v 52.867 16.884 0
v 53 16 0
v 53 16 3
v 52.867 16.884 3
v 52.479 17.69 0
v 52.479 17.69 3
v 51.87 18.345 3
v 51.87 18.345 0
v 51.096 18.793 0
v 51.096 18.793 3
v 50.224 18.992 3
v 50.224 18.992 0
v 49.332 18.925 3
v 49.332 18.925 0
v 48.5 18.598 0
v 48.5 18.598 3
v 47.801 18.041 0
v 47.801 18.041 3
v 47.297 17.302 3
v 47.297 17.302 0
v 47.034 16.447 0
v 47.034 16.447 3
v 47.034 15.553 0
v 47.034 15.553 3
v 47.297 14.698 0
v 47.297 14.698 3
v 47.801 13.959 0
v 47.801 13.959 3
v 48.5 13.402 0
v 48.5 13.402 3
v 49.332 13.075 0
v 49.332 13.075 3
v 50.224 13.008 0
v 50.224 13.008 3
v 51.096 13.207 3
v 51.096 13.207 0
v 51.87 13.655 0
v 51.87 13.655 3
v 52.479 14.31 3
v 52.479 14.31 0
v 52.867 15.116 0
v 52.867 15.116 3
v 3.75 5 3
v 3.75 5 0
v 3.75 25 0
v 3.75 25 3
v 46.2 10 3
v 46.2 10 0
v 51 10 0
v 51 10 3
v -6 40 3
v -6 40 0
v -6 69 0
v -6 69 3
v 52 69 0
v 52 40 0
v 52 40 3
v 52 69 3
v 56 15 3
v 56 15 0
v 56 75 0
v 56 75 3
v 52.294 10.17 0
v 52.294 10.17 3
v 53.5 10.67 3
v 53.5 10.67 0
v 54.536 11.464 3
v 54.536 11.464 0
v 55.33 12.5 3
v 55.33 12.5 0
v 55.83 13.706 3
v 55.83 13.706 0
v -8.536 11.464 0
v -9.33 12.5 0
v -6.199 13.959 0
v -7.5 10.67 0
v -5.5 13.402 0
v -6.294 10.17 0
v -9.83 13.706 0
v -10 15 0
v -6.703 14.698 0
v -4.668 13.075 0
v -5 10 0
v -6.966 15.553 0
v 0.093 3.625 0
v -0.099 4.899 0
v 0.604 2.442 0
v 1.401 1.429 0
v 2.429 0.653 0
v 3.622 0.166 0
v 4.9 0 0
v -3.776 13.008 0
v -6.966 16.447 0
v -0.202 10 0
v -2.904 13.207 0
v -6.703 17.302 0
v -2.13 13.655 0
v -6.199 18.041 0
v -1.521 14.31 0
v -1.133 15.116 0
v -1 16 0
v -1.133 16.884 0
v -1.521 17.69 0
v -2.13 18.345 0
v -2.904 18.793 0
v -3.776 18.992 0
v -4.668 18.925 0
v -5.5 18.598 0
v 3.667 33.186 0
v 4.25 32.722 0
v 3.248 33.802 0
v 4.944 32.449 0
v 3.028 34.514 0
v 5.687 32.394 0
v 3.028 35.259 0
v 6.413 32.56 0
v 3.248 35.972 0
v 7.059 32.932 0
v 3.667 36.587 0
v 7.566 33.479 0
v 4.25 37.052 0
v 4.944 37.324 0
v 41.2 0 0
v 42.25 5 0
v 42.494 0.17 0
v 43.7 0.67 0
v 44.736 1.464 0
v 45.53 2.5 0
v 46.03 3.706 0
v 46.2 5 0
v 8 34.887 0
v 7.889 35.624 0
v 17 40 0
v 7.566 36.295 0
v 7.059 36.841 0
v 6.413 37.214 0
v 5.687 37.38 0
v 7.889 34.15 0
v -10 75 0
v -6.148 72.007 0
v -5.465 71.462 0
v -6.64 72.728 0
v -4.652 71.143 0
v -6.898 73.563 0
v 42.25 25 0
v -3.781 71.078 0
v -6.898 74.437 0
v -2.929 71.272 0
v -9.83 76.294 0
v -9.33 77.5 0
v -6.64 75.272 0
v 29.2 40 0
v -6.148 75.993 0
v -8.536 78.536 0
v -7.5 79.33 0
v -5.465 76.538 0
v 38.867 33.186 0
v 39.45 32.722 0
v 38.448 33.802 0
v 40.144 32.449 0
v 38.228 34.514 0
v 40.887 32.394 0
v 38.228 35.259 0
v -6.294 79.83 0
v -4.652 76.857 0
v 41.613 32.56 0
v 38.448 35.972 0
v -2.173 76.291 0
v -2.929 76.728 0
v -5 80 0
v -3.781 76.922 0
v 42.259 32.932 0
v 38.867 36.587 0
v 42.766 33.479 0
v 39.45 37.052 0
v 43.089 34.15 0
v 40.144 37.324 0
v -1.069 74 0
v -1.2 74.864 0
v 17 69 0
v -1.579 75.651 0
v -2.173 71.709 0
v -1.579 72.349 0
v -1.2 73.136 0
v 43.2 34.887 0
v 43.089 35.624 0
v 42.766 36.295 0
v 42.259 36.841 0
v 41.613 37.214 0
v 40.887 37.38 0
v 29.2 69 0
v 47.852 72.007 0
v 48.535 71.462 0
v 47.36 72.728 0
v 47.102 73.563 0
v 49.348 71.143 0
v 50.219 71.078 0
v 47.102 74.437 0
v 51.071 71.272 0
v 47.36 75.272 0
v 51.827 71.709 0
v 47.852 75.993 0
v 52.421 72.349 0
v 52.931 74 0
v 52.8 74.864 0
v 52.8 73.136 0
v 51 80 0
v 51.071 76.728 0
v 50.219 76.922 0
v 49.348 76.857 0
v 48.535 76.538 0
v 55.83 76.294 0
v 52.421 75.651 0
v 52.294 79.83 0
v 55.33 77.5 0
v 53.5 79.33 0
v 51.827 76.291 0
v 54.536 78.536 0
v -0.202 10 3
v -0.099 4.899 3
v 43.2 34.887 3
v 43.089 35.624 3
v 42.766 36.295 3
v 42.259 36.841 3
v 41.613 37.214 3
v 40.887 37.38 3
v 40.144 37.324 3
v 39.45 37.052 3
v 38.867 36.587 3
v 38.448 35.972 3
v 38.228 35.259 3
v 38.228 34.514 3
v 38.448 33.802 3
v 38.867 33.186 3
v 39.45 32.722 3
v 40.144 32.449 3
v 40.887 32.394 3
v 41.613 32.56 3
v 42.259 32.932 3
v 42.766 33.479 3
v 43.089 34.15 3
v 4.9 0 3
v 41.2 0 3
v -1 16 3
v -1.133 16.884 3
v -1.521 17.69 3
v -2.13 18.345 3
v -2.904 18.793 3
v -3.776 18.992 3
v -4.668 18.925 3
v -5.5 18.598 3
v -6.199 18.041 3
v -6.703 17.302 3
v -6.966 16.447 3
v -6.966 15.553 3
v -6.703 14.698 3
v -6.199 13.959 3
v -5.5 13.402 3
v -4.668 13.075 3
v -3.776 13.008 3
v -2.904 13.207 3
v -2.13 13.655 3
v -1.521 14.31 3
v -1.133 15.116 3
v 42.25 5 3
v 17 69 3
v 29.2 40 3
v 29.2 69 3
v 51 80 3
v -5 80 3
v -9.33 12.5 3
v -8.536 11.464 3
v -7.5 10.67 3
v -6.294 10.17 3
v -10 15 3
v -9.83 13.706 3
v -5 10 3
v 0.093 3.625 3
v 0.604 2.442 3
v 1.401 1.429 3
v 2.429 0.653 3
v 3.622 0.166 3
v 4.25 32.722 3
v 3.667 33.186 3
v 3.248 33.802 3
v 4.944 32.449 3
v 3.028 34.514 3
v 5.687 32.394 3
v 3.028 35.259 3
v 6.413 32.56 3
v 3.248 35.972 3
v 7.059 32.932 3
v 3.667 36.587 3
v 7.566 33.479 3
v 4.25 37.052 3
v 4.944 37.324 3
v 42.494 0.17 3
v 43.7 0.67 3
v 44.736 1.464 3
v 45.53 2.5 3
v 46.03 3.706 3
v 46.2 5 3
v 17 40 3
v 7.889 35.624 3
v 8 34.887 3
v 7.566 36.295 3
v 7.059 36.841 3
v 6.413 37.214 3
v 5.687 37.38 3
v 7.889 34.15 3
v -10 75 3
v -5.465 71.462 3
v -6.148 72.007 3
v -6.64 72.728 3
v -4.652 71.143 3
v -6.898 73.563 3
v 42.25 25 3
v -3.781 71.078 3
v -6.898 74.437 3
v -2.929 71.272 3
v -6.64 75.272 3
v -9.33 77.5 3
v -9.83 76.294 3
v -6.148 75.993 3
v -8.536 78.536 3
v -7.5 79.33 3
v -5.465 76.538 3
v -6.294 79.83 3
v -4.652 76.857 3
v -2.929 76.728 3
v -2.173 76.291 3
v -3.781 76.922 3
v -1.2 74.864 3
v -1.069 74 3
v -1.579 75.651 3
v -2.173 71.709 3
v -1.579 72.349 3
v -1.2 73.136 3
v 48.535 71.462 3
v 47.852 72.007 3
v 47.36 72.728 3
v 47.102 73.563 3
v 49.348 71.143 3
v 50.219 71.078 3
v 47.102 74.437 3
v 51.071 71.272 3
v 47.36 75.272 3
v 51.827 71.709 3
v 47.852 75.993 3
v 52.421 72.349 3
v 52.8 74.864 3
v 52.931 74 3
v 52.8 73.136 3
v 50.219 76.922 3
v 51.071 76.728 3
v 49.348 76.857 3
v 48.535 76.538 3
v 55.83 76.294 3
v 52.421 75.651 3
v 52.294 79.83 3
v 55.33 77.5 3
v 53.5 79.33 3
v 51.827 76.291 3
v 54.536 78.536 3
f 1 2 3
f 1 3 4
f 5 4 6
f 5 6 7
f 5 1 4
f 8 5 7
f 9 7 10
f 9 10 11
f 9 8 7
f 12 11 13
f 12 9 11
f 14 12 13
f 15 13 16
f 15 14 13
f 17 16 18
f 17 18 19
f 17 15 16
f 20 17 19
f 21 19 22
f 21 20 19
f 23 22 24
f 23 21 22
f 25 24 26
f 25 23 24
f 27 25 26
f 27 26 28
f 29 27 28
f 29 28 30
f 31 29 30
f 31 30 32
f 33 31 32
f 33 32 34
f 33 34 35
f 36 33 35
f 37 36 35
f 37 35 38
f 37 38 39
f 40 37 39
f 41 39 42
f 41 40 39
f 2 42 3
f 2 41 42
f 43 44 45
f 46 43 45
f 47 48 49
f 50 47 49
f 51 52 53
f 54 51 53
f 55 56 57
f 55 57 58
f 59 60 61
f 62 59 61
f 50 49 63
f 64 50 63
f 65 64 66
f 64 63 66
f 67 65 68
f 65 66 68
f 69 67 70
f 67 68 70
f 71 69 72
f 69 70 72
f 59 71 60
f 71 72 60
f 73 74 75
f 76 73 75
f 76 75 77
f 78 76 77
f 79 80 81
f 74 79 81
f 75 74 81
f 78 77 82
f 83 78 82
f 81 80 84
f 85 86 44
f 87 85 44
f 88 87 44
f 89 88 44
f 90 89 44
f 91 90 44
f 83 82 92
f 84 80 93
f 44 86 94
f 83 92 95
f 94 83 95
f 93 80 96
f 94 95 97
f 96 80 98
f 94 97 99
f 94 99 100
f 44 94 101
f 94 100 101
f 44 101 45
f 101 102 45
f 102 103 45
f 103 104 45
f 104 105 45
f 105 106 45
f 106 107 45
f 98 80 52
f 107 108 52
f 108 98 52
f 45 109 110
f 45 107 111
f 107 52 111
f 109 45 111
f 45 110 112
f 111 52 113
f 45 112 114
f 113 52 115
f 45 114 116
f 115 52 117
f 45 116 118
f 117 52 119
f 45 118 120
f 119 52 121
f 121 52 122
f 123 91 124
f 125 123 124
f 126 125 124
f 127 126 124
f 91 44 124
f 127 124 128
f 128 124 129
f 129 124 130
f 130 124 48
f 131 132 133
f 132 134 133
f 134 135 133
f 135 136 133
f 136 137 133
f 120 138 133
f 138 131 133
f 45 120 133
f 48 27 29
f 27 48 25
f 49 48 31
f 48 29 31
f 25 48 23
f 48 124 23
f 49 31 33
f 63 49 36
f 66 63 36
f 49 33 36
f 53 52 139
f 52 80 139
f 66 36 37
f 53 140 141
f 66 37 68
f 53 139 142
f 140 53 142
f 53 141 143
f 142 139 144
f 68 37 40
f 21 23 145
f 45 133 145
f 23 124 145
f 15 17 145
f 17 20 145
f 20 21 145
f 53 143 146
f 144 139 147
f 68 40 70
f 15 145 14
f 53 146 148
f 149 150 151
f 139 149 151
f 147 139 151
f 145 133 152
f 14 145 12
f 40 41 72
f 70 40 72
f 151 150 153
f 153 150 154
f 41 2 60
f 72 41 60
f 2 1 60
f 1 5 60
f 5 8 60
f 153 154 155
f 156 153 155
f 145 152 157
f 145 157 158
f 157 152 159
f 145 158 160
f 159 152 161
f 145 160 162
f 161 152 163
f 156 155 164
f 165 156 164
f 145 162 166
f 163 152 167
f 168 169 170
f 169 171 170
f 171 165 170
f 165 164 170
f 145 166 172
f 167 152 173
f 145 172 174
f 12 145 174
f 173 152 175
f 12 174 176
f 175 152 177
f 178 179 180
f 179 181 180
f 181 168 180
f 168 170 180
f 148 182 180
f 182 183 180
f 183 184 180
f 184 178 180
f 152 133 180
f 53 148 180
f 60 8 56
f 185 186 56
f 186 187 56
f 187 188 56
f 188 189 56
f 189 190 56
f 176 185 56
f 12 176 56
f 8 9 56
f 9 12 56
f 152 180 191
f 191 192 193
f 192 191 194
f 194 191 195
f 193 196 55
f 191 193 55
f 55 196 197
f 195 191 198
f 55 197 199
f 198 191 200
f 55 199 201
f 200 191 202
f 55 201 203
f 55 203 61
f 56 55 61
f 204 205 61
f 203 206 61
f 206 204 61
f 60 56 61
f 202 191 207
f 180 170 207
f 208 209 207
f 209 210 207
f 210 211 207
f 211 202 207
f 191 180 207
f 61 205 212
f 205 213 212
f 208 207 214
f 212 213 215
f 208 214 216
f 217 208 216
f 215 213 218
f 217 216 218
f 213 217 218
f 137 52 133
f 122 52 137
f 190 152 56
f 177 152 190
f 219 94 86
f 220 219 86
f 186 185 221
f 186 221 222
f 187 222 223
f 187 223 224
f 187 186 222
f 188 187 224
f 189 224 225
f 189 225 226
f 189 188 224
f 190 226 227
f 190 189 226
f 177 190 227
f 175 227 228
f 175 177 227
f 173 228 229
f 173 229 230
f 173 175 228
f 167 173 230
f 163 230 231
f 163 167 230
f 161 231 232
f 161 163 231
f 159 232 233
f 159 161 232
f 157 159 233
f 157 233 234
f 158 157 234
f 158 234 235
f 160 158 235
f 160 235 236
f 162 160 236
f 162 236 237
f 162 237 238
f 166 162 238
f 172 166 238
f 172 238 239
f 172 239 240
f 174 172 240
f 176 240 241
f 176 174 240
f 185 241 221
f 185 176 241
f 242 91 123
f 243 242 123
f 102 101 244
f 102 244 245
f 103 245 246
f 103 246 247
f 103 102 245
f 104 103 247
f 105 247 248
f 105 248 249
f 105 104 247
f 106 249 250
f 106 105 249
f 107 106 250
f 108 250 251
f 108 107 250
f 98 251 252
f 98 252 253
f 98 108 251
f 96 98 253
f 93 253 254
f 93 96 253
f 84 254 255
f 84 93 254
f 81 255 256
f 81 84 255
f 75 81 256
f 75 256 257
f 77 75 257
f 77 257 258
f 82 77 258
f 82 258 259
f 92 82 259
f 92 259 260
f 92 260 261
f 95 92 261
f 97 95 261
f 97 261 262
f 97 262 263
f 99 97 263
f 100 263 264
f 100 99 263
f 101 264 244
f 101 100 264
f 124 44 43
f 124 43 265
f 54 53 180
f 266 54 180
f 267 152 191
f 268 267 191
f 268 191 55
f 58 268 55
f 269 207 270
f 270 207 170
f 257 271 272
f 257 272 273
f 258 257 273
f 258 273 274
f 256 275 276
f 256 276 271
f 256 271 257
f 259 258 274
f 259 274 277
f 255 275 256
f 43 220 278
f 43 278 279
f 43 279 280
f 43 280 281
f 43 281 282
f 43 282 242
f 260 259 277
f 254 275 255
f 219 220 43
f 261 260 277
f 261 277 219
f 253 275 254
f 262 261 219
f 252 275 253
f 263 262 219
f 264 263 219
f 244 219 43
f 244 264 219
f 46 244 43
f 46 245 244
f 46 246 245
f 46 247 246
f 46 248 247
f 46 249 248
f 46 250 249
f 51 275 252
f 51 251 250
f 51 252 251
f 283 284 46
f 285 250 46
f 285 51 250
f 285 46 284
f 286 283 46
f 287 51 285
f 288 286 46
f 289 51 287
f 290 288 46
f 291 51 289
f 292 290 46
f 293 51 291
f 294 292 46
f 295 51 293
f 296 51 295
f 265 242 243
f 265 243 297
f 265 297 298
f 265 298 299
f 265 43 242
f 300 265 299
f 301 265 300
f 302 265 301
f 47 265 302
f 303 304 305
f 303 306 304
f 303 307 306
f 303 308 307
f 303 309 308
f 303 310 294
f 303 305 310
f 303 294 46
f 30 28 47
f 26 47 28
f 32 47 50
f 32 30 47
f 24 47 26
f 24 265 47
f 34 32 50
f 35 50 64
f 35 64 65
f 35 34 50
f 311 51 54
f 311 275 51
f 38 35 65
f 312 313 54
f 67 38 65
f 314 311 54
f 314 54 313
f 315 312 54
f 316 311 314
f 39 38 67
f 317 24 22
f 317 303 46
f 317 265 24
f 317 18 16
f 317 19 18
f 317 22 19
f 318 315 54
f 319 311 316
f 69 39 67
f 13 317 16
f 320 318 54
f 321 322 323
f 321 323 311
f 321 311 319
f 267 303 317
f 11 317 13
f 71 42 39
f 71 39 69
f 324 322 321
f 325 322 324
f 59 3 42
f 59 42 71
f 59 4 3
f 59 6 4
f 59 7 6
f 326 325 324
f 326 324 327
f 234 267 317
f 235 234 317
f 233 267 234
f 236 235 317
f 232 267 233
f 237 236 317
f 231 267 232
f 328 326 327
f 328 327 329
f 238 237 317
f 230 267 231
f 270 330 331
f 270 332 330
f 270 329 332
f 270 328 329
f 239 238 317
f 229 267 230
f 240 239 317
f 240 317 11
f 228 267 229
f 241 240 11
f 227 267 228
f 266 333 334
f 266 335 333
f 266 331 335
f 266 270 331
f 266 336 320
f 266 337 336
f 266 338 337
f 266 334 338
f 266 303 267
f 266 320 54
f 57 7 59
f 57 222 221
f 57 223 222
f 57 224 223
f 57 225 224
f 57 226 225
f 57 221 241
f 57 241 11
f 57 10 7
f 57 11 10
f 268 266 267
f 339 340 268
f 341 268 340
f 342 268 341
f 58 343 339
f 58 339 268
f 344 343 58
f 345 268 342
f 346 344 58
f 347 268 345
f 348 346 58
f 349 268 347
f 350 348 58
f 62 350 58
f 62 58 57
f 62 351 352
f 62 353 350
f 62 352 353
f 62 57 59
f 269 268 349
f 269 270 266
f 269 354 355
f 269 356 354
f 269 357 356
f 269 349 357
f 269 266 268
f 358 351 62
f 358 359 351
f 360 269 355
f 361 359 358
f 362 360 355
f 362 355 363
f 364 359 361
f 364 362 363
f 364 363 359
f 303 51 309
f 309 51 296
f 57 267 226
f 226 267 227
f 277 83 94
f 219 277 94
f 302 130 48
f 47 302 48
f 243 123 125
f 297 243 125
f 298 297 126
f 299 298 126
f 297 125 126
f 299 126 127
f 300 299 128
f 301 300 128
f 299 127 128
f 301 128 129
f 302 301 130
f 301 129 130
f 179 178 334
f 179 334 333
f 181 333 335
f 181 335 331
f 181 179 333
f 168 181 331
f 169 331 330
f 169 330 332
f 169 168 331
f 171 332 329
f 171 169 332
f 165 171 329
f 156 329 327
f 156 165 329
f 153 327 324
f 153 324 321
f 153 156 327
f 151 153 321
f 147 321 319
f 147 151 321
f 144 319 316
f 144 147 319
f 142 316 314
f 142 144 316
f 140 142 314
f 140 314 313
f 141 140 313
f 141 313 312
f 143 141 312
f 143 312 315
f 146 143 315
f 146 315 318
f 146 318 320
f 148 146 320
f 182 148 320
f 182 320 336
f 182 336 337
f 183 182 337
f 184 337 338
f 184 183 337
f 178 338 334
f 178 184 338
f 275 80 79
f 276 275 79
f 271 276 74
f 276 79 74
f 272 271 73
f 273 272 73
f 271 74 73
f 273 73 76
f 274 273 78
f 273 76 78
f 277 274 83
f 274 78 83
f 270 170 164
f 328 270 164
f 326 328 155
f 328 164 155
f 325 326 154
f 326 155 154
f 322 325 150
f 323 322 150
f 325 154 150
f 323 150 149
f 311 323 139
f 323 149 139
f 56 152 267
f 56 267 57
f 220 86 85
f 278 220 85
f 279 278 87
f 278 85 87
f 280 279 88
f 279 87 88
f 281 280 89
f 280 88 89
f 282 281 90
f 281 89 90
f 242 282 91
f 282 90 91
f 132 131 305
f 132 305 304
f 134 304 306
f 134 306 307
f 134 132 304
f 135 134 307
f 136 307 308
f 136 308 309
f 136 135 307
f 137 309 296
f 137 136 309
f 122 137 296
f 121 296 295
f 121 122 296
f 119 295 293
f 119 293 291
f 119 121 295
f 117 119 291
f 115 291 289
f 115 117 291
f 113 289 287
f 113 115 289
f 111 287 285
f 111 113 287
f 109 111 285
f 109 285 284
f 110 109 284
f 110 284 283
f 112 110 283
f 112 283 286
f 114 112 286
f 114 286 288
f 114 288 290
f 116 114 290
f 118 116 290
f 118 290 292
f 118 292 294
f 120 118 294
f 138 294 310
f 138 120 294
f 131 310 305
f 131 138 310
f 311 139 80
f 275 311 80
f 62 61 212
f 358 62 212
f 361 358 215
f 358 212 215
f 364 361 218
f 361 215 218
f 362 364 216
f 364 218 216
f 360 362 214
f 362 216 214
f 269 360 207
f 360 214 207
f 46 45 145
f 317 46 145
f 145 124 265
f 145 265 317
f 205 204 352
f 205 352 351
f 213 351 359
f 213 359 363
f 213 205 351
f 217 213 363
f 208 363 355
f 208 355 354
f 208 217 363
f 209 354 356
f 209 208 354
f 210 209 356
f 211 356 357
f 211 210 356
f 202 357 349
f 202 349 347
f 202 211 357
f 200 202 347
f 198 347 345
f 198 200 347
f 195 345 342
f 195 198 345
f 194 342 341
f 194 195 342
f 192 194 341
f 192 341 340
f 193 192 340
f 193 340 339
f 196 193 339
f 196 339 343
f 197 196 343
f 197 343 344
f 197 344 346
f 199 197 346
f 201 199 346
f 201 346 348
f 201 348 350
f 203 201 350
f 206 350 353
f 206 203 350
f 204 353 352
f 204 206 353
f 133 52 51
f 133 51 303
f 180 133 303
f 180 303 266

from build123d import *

# Parameters (mm, degrees)
F0_R     = 3
F0_R_2   = 2.5
F0_W     = 38.5
F0_H     = 20
F0_W_2   = 23
F0_H_2   = 29
F0_R_3   = 2.9306388833
F0_W_3   = 22.8
F1_DEPTH = 3


# Not quite as in the source:
# - a feature names something its author has since deleted; it is built from what else it names


with BuildPart() as f1:
    # F0 (on Top) → F1 (new body)
    with BuildSketch(Plane.XY):
        with BuildLine():
            ThreePointArc((-0.0987510204, 4.899238456), (1.4005055782, 1.429019202), (4.9002335876, 0))
            Line((4.9002335876, 0), (41.2, 0))
            ThreePointArc((41.2, 0), (44.7355339059, 1.4644660941), (46.2, 5))
            Line((46.2, 5), (46.2, 10))
            Line((46.2, 10), (51, 10))
            ThreePointArc((51, 10), (54.5355339059, 11.4644660941), (56, 15))
            Line((56, 15), (56, 30))
            Line((56, 30), (56, 75))
            ThreePointArc((56, 75), (54.5355339059, 78.5355339059), (51, 80))
            Line((51, 80), (-5, 80))
            ThreePointArc((-5, 80), (-8.5355339059, 78.5355339059), (-10, 75))
            Line((-10, 75), (-10, 30))
            Line((-10, 30), (-10, 15))
            ThreePointArc((-10, 15), (-8.5355339059, 11.4644660941), (-5, 10))
            Line((-5, 10), (-0.2015640213, 10))
            Line((-0.2015640213, 10), (-0.0987510204, 4.899238456))
        make_face()
        with Locations((-4, 16)):
            Circle(F0_R, mode=Mode.SUBTRACT)
        with Locations((5.5, 34.8868072033)):
            Circle(F0_R_2, mode=Mode.SUBTRACT)
        with Locations((23, 15)):
            Rectangle(F0_W, F0_H, mode=Mode.SUBTRACT)
        with Locations((50, 16)):
            Circle(F0_R, mode=Mode.SUBTRACT)
        with Locations((40.7, 34.8868072033)):
            Circle(F0_R_2, mode=Mode.SUBTRACT)
        with Locations((5.5, 54.5)):
            Rectangle(F0_W_2, F0_H_2, mode=Mode.SUBTRACT)
        with Locations((-4, 74)):
            Circle(F0_R_3, mode=Mode.SUBTRACT)
        with Locations((40.6, 54.5)):
            Rectangle(F0_W_3, F0_H_2, mode=Mode.SUBTRACT)
        with Locations((50, 74)):
            Circle(F0_R_3, mode=Mode.SUBTRACT)
    extrude(amount=F1_DEPTH)


solid = f1.part
